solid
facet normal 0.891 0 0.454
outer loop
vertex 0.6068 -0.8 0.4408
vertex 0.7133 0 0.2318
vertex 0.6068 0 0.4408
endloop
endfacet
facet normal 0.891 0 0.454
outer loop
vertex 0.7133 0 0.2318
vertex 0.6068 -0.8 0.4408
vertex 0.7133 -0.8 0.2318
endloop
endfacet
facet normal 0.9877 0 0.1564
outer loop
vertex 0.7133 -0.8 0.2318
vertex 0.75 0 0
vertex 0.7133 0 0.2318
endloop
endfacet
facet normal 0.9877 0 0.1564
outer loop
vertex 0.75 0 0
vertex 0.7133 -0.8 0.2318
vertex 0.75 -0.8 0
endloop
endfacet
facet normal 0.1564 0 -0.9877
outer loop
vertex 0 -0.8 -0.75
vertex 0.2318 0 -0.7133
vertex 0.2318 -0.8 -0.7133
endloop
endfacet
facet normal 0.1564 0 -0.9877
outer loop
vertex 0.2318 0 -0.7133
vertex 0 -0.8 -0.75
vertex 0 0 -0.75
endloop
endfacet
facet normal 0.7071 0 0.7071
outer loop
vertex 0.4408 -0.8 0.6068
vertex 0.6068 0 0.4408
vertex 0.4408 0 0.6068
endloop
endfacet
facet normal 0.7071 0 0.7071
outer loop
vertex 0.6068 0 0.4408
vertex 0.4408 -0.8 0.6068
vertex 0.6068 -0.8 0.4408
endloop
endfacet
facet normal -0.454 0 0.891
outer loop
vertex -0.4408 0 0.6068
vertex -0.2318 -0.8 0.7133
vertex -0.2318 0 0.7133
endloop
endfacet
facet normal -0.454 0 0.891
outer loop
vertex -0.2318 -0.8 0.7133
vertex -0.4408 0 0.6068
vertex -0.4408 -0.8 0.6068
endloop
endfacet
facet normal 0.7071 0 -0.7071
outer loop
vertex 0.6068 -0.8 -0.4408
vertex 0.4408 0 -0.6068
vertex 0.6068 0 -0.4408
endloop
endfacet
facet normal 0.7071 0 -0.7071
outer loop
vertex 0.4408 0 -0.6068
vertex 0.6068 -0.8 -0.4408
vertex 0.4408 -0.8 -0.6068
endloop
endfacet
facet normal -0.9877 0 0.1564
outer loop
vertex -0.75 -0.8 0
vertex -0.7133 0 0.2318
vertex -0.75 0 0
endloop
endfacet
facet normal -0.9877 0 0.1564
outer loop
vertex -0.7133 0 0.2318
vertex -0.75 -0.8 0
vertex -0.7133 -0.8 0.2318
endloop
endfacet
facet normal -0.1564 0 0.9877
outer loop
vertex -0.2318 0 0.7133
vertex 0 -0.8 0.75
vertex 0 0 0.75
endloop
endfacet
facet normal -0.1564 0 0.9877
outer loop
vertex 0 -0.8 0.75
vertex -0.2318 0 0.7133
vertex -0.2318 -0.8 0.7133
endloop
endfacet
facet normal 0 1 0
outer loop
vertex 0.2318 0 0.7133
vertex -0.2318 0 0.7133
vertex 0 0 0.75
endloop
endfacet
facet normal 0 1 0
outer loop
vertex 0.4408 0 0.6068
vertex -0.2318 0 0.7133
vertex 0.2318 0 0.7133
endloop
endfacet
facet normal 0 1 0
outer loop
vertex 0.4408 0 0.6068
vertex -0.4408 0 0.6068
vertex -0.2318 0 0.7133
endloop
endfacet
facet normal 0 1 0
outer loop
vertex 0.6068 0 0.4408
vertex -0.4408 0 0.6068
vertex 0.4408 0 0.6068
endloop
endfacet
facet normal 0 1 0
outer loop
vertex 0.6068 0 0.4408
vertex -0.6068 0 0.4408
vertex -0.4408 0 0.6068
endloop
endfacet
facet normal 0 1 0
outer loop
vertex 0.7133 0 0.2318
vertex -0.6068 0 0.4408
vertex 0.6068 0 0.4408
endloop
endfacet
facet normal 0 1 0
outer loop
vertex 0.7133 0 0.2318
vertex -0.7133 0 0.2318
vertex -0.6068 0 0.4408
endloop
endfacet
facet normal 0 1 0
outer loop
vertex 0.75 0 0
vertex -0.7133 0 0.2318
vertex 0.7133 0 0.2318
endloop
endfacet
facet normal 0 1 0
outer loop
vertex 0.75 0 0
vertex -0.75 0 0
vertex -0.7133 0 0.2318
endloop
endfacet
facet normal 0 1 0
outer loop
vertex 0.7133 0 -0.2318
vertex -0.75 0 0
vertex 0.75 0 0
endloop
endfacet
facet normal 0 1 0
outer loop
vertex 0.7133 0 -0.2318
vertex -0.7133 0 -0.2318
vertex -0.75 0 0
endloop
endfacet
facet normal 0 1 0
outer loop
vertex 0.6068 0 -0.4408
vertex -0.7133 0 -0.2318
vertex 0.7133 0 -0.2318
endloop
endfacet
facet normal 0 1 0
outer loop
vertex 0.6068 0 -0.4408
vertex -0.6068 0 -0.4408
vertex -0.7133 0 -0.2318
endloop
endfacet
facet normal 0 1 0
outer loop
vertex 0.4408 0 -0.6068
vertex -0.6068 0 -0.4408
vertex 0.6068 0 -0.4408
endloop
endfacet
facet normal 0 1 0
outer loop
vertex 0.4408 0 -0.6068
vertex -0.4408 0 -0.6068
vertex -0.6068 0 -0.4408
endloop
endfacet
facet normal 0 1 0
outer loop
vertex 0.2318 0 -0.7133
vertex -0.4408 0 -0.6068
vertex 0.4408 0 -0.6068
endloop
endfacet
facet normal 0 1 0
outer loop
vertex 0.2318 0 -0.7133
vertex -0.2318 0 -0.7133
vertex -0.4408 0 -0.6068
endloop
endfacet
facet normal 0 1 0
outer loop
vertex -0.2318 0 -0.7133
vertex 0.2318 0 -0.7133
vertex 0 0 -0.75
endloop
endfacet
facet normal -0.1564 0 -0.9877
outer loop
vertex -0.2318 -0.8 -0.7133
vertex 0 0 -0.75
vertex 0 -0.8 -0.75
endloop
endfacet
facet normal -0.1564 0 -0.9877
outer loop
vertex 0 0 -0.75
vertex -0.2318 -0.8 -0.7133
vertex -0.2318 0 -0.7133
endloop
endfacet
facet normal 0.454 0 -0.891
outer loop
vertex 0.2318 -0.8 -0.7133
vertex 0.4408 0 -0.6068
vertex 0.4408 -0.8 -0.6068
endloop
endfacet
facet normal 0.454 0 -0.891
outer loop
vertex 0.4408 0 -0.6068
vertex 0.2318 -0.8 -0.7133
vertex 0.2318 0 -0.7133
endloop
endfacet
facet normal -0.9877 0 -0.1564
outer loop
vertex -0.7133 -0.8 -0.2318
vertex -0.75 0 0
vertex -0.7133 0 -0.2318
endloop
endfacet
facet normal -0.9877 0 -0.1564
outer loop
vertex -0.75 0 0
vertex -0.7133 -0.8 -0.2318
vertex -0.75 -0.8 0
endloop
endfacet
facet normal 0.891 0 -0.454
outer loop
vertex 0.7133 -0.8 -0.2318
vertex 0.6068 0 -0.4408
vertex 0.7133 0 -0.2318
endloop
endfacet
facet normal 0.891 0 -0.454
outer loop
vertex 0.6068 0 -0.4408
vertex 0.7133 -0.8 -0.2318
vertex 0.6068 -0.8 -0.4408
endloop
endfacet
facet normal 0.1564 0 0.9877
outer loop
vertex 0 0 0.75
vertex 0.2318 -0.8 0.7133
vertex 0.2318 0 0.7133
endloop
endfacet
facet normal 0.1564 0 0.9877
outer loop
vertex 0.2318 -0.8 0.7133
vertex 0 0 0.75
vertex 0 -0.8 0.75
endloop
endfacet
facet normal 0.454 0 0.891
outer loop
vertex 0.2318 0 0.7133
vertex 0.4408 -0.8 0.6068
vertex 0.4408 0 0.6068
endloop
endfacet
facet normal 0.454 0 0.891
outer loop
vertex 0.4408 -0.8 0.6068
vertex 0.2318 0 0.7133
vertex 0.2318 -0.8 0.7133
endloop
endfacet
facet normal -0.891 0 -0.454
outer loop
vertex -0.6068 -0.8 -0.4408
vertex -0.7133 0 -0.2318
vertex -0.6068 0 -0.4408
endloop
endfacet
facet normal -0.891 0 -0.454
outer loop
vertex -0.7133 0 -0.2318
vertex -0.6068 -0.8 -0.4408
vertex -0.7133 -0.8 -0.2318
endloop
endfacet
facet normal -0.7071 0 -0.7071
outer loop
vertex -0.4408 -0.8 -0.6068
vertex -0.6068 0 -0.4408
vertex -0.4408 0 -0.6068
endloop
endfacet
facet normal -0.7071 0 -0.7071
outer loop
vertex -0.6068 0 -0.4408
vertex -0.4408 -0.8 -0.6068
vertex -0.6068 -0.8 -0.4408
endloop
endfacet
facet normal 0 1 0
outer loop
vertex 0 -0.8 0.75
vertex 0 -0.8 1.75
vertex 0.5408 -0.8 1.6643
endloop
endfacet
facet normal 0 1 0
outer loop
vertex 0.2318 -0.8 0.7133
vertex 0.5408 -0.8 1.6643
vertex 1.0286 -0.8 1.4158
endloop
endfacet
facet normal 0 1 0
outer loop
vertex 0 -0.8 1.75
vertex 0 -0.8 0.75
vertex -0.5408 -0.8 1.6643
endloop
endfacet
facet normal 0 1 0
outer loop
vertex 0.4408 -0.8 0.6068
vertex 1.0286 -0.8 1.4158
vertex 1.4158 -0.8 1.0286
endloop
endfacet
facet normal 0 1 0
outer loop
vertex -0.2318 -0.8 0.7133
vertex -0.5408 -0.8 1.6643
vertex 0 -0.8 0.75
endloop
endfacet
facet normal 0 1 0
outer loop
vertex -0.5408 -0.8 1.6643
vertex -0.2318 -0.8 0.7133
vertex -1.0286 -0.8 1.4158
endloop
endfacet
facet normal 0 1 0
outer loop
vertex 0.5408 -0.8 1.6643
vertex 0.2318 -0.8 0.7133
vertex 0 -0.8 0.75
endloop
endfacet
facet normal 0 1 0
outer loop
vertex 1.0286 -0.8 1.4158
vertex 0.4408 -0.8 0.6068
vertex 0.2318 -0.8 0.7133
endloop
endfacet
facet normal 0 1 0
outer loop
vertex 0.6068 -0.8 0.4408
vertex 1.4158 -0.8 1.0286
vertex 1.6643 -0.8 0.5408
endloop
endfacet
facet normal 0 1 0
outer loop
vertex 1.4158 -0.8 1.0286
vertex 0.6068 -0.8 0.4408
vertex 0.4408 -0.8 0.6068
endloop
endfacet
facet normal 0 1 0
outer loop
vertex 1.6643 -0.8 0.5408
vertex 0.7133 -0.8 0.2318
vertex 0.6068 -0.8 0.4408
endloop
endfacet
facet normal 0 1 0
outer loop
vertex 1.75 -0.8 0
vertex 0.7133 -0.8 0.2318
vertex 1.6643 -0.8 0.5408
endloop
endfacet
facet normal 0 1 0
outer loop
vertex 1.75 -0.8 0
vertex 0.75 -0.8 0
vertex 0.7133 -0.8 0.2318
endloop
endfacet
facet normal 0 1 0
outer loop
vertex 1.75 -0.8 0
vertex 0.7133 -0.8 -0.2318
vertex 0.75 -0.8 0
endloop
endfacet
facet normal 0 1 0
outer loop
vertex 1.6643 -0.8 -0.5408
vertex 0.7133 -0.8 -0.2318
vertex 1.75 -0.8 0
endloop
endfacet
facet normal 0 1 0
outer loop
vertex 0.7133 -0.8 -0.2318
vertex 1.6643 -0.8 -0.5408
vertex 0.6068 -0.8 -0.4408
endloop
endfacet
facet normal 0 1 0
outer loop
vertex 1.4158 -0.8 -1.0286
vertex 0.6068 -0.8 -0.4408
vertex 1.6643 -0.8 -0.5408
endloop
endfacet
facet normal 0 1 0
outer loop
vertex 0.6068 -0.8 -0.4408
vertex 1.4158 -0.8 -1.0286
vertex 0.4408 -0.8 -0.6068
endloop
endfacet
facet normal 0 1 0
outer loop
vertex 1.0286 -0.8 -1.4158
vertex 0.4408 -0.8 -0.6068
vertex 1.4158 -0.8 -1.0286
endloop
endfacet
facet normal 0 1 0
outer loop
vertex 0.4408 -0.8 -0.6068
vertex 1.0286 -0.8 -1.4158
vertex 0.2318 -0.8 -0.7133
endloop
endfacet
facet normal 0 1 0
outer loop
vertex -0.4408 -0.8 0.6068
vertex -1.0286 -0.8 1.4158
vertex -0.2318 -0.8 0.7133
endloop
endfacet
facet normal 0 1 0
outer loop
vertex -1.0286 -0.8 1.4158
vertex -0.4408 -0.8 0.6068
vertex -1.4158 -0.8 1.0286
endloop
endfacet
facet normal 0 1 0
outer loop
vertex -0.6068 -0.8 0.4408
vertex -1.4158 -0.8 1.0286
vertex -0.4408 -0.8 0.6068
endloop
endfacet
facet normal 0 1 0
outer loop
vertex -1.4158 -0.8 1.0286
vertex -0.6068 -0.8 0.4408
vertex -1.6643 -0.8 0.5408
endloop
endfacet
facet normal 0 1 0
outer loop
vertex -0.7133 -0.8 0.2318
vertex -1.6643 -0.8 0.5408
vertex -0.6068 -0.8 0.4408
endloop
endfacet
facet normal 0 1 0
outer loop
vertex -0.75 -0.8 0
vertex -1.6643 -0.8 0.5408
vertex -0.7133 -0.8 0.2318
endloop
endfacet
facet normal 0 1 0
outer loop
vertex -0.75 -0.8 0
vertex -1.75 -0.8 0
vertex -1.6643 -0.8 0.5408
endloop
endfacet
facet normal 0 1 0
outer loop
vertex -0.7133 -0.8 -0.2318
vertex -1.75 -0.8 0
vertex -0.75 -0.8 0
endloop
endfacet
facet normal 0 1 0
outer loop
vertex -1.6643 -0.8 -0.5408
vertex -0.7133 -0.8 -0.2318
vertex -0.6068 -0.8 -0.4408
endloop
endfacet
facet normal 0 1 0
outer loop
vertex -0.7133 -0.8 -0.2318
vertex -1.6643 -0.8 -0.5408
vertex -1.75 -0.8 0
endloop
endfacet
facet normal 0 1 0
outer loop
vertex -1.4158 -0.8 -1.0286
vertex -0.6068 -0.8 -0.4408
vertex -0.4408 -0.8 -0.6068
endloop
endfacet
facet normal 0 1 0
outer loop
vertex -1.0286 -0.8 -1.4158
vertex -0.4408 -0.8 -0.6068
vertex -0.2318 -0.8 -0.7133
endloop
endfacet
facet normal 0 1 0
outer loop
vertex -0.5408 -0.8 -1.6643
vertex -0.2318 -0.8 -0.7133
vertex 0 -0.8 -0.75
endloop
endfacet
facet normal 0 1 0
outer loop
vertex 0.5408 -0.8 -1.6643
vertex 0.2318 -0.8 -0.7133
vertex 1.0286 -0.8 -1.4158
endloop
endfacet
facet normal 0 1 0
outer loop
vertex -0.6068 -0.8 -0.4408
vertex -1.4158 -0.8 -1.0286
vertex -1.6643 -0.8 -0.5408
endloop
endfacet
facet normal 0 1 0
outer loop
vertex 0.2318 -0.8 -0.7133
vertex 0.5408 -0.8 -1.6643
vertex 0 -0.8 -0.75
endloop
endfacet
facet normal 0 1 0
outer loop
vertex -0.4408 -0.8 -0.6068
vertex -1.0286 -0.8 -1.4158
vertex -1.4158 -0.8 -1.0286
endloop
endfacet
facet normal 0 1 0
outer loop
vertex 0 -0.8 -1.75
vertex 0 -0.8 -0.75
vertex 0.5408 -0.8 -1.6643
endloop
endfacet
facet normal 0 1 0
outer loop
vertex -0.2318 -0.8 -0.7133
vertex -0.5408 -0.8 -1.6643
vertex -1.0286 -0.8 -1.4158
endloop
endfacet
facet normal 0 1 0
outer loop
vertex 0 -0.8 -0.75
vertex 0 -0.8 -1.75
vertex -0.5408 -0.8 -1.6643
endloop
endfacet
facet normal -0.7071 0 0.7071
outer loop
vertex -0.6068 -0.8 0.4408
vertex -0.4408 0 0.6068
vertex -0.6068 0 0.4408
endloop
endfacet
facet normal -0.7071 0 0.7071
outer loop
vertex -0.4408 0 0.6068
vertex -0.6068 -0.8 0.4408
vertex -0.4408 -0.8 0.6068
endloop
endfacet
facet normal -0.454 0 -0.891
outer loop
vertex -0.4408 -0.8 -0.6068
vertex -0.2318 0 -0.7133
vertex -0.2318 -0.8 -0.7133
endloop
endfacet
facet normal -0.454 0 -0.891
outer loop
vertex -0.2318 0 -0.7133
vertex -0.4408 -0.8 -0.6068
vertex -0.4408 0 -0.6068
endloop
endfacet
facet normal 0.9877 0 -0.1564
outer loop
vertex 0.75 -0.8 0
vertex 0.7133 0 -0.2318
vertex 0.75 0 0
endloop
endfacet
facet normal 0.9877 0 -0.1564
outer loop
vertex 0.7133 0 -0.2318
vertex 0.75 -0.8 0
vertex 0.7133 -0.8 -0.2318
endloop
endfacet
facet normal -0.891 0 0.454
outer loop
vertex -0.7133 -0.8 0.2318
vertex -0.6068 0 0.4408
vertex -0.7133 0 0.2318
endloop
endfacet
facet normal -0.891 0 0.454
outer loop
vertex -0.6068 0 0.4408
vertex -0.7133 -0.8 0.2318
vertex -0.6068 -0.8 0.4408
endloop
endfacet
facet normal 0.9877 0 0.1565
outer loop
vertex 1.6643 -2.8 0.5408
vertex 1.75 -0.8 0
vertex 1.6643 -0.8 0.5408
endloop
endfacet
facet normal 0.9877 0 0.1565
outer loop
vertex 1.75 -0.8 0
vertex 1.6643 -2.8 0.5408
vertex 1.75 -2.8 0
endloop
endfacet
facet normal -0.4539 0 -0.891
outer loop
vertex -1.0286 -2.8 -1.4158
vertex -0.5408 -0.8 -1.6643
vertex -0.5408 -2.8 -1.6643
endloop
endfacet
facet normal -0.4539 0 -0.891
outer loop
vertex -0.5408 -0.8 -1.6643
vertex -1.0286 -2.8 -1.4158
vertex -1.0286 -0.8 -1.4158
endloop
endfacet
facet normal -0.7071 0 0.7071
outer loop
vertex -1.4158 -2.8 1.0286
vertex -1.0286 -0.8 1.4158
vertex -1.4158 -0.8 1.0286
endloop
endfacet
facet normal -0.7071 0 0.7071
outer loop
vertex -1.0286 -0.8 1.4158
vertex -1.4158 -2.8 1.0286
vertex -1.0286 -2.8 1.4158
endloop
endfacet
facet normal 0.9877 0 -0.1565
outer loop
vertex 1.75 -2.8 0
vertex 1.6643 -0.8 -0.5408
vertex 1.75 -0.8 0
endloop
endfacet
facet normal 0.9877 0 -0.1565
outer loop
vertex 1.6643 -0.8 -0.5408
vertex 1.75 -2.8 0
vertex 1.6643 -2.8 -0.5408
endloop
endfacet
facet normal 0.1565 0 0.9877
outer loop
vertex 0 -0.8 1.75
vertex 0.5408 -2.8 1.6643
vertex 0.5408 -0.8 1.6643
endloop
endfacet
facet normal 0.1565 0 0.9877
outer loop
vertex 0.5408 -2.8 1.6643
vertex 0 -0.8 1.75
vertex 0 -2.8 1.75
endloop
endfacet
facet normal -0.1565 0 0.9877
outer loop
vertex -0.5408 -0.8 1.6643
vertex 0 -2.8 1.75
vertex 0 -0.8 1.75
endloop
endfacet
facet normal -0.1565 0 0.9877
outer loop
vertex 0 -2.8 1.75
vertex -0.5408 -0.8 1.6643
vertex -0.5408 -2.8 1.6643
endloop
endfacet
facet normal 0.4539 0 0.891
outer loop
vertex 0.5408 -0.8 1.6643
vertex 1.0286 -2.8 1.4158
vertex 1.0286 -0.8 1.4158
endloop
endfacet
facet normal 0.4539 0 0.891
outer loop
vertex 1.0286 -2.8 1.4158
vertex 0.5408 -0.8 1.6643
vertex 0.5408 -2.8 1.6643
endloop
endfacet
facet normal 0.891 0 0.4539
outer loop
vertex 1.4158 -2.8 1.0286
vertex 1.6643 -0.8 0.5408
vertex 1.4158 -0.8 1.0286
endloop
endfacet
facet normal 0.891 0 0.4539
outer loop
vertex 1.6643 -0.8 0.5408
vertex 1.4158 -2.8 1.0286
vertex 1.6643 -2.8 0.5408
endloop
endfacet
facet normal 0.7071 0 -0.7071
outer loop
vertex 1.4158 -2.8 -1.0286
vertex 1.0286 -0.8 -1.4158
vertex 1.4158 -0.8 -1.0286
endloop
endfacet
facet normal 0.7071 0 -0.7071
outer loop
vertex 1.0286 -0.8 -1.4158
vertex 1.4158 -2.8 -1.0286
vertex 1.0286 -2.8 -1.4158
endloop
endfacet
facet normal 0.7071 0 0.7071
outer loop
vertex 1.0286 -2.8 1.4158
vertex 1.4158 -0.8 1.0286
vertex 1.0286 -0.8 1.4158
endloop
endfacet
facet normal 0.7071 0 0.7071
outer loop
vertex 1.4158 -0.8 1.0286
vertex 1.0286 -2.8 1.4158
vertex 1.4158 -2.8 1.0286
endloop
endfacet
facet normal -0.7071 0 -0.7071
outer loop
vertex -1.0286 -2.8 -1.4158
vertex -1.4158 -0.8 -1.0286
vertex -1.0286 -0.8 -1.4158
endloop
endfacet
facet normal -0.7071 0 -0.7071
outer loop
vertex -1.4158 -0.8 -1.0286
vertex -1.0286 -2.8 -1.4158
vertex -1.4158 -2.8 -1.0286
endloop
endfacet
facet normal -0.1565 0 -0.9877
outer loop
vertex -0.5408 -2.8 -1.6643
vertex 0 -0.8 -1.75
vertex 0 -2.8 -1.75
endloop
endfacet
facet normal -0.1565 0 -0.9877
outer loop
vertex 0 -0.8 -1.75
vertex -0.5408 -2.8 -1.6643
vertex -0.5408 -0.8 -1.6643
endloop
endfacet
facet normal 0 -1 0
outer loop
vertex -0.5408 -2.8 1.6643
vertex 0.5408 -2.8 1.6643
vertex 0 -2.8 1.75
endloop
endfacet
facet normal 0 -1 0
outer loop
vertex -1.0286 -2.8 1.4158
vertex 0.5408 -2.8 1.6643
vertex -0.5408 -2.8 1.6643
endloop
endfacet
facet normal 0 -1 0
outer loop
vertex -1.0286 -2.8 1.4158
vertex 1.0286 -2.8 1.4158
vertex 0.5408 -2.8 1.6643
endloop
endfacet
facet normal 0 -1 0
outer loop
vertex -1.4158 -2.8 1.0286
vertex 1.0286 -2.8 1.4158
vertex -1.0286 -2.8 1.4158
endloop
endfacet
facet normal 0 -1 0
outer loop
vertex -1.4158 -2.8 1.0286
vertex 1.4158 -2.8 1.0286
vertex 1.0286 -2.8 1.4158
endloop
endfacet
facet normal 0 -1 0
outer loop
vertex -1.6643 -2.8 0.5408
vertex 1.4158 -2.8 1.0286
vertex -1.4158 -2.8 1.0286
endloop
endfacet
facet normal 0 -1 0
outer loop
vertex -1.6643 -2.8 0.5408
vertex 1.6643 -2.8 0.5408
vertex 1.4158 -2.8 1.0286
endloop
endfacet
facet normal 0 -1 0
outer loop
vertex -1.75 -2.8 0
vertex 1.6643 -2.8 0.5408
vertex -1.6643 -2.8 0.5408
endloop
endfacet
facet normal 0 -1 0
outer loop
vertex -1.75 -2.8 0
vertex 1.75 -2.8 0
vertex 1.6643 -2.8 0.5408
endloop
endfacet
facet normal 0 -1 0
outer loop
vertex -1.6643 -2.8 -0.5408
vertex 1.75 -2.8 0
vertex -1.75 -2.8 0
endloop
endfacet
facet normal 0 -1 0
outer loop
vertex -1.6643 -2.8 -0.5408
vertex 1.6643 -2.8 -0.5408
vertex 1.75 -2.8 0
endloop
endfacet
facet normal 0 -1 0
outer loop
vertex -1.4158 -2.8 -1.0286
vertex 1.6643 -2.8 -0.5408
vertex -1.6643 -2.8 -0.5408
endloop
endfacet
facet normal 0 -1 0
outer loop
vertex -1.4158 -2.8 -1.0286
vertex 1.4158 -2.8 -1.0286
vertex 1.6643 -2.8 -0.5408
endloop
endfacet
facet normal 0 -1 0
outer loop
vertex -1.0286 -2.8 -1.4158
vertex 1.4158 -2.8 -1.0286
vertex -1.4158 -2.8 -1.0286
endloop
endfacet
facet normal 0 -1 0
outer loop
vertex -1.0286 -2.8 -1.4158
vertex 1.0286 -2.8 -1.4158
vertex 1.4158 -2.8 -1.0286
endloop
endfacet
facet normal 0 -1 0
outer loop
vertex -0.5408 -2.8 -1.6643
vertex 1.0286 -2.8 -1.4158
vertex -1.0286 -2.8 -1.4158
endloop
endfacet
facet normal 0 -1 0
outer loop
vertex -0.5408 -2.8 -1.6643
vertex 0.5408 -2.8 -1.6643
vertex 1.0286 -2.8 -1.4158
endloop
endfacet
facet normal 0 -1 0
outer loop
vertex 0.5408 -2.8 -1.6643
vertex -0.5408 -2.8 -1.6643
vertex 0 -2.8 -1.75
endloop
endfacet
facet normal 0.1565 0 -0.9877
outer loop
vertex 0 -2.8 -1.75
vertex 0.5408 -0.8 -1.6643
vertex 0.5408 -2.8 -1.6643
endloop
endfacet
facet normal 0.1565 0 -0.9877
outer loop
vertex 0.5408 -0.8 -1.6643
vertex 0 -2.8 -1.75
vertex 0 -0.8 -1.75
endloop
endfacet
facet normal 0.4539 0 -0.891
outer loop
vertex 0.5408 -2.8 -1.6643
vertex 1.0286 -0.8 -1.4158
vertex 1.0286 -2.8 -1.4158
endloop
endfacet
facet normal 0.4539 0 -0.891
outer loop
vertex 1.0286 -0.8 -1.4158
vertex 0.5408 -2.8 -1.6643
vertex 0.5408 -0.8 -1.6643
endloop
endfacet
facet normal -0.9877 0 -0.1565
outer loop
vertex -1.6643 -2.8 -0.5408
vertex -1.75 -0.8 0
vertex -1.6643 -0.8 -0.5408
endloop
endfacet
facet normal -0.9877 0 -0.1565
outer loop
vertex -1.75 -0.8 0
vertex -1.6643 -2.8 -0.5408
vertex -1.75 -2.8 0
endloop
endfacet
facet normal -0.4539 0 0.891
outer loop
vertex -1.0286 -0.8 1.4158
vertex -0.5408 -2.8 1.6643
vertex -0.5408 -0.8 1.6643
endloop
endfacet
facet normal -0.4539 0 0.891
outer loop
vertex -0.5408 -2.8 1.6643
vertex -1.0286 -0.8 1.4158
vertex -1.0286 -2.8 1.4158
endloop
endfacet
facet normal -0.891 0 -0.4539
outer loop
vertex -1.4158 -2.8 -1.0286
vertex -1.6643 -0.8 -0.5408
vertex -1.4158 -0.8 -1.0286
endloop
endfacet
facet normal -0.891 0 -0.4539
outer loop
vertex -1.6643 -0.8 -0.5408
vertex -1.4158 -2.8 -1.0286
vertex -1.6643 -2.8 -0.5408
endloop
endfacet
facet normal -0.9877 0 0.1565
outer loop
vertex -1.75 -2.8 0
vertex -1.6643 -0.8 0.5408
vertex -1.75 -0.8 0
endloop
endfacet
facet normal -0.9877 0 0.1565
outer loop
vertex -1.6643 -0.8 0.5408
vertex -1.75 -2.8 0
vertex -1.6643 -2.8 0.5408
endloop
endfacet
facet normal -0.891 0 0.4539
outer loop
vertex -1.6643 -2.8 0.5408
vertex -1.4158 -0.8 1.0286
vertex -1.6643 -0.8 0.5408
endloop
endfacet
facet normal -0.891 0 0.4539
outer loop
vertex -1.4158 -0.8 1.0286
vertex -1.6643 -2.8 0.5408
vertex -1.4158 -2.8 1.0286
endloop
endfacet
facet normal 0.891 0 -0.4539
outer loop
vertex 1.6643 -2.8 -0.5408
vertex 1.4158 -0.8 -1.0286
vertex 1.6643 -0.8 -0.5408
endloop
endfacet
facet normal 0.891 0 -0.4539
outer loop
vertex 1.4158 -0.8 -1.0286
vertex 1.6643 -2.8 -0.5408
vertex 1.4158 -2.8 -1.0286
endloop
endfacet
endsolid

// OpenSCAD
union() {
	rotate([90,0,0])
		cylinder(0.8,0.75,0.75,$fn=20);
	translate([0,-0.8])
		rotate([90,0,0])
			cylinder(2,1.75,1.75,$fn=20);
}

//include <spaceship_turret.scad>;
